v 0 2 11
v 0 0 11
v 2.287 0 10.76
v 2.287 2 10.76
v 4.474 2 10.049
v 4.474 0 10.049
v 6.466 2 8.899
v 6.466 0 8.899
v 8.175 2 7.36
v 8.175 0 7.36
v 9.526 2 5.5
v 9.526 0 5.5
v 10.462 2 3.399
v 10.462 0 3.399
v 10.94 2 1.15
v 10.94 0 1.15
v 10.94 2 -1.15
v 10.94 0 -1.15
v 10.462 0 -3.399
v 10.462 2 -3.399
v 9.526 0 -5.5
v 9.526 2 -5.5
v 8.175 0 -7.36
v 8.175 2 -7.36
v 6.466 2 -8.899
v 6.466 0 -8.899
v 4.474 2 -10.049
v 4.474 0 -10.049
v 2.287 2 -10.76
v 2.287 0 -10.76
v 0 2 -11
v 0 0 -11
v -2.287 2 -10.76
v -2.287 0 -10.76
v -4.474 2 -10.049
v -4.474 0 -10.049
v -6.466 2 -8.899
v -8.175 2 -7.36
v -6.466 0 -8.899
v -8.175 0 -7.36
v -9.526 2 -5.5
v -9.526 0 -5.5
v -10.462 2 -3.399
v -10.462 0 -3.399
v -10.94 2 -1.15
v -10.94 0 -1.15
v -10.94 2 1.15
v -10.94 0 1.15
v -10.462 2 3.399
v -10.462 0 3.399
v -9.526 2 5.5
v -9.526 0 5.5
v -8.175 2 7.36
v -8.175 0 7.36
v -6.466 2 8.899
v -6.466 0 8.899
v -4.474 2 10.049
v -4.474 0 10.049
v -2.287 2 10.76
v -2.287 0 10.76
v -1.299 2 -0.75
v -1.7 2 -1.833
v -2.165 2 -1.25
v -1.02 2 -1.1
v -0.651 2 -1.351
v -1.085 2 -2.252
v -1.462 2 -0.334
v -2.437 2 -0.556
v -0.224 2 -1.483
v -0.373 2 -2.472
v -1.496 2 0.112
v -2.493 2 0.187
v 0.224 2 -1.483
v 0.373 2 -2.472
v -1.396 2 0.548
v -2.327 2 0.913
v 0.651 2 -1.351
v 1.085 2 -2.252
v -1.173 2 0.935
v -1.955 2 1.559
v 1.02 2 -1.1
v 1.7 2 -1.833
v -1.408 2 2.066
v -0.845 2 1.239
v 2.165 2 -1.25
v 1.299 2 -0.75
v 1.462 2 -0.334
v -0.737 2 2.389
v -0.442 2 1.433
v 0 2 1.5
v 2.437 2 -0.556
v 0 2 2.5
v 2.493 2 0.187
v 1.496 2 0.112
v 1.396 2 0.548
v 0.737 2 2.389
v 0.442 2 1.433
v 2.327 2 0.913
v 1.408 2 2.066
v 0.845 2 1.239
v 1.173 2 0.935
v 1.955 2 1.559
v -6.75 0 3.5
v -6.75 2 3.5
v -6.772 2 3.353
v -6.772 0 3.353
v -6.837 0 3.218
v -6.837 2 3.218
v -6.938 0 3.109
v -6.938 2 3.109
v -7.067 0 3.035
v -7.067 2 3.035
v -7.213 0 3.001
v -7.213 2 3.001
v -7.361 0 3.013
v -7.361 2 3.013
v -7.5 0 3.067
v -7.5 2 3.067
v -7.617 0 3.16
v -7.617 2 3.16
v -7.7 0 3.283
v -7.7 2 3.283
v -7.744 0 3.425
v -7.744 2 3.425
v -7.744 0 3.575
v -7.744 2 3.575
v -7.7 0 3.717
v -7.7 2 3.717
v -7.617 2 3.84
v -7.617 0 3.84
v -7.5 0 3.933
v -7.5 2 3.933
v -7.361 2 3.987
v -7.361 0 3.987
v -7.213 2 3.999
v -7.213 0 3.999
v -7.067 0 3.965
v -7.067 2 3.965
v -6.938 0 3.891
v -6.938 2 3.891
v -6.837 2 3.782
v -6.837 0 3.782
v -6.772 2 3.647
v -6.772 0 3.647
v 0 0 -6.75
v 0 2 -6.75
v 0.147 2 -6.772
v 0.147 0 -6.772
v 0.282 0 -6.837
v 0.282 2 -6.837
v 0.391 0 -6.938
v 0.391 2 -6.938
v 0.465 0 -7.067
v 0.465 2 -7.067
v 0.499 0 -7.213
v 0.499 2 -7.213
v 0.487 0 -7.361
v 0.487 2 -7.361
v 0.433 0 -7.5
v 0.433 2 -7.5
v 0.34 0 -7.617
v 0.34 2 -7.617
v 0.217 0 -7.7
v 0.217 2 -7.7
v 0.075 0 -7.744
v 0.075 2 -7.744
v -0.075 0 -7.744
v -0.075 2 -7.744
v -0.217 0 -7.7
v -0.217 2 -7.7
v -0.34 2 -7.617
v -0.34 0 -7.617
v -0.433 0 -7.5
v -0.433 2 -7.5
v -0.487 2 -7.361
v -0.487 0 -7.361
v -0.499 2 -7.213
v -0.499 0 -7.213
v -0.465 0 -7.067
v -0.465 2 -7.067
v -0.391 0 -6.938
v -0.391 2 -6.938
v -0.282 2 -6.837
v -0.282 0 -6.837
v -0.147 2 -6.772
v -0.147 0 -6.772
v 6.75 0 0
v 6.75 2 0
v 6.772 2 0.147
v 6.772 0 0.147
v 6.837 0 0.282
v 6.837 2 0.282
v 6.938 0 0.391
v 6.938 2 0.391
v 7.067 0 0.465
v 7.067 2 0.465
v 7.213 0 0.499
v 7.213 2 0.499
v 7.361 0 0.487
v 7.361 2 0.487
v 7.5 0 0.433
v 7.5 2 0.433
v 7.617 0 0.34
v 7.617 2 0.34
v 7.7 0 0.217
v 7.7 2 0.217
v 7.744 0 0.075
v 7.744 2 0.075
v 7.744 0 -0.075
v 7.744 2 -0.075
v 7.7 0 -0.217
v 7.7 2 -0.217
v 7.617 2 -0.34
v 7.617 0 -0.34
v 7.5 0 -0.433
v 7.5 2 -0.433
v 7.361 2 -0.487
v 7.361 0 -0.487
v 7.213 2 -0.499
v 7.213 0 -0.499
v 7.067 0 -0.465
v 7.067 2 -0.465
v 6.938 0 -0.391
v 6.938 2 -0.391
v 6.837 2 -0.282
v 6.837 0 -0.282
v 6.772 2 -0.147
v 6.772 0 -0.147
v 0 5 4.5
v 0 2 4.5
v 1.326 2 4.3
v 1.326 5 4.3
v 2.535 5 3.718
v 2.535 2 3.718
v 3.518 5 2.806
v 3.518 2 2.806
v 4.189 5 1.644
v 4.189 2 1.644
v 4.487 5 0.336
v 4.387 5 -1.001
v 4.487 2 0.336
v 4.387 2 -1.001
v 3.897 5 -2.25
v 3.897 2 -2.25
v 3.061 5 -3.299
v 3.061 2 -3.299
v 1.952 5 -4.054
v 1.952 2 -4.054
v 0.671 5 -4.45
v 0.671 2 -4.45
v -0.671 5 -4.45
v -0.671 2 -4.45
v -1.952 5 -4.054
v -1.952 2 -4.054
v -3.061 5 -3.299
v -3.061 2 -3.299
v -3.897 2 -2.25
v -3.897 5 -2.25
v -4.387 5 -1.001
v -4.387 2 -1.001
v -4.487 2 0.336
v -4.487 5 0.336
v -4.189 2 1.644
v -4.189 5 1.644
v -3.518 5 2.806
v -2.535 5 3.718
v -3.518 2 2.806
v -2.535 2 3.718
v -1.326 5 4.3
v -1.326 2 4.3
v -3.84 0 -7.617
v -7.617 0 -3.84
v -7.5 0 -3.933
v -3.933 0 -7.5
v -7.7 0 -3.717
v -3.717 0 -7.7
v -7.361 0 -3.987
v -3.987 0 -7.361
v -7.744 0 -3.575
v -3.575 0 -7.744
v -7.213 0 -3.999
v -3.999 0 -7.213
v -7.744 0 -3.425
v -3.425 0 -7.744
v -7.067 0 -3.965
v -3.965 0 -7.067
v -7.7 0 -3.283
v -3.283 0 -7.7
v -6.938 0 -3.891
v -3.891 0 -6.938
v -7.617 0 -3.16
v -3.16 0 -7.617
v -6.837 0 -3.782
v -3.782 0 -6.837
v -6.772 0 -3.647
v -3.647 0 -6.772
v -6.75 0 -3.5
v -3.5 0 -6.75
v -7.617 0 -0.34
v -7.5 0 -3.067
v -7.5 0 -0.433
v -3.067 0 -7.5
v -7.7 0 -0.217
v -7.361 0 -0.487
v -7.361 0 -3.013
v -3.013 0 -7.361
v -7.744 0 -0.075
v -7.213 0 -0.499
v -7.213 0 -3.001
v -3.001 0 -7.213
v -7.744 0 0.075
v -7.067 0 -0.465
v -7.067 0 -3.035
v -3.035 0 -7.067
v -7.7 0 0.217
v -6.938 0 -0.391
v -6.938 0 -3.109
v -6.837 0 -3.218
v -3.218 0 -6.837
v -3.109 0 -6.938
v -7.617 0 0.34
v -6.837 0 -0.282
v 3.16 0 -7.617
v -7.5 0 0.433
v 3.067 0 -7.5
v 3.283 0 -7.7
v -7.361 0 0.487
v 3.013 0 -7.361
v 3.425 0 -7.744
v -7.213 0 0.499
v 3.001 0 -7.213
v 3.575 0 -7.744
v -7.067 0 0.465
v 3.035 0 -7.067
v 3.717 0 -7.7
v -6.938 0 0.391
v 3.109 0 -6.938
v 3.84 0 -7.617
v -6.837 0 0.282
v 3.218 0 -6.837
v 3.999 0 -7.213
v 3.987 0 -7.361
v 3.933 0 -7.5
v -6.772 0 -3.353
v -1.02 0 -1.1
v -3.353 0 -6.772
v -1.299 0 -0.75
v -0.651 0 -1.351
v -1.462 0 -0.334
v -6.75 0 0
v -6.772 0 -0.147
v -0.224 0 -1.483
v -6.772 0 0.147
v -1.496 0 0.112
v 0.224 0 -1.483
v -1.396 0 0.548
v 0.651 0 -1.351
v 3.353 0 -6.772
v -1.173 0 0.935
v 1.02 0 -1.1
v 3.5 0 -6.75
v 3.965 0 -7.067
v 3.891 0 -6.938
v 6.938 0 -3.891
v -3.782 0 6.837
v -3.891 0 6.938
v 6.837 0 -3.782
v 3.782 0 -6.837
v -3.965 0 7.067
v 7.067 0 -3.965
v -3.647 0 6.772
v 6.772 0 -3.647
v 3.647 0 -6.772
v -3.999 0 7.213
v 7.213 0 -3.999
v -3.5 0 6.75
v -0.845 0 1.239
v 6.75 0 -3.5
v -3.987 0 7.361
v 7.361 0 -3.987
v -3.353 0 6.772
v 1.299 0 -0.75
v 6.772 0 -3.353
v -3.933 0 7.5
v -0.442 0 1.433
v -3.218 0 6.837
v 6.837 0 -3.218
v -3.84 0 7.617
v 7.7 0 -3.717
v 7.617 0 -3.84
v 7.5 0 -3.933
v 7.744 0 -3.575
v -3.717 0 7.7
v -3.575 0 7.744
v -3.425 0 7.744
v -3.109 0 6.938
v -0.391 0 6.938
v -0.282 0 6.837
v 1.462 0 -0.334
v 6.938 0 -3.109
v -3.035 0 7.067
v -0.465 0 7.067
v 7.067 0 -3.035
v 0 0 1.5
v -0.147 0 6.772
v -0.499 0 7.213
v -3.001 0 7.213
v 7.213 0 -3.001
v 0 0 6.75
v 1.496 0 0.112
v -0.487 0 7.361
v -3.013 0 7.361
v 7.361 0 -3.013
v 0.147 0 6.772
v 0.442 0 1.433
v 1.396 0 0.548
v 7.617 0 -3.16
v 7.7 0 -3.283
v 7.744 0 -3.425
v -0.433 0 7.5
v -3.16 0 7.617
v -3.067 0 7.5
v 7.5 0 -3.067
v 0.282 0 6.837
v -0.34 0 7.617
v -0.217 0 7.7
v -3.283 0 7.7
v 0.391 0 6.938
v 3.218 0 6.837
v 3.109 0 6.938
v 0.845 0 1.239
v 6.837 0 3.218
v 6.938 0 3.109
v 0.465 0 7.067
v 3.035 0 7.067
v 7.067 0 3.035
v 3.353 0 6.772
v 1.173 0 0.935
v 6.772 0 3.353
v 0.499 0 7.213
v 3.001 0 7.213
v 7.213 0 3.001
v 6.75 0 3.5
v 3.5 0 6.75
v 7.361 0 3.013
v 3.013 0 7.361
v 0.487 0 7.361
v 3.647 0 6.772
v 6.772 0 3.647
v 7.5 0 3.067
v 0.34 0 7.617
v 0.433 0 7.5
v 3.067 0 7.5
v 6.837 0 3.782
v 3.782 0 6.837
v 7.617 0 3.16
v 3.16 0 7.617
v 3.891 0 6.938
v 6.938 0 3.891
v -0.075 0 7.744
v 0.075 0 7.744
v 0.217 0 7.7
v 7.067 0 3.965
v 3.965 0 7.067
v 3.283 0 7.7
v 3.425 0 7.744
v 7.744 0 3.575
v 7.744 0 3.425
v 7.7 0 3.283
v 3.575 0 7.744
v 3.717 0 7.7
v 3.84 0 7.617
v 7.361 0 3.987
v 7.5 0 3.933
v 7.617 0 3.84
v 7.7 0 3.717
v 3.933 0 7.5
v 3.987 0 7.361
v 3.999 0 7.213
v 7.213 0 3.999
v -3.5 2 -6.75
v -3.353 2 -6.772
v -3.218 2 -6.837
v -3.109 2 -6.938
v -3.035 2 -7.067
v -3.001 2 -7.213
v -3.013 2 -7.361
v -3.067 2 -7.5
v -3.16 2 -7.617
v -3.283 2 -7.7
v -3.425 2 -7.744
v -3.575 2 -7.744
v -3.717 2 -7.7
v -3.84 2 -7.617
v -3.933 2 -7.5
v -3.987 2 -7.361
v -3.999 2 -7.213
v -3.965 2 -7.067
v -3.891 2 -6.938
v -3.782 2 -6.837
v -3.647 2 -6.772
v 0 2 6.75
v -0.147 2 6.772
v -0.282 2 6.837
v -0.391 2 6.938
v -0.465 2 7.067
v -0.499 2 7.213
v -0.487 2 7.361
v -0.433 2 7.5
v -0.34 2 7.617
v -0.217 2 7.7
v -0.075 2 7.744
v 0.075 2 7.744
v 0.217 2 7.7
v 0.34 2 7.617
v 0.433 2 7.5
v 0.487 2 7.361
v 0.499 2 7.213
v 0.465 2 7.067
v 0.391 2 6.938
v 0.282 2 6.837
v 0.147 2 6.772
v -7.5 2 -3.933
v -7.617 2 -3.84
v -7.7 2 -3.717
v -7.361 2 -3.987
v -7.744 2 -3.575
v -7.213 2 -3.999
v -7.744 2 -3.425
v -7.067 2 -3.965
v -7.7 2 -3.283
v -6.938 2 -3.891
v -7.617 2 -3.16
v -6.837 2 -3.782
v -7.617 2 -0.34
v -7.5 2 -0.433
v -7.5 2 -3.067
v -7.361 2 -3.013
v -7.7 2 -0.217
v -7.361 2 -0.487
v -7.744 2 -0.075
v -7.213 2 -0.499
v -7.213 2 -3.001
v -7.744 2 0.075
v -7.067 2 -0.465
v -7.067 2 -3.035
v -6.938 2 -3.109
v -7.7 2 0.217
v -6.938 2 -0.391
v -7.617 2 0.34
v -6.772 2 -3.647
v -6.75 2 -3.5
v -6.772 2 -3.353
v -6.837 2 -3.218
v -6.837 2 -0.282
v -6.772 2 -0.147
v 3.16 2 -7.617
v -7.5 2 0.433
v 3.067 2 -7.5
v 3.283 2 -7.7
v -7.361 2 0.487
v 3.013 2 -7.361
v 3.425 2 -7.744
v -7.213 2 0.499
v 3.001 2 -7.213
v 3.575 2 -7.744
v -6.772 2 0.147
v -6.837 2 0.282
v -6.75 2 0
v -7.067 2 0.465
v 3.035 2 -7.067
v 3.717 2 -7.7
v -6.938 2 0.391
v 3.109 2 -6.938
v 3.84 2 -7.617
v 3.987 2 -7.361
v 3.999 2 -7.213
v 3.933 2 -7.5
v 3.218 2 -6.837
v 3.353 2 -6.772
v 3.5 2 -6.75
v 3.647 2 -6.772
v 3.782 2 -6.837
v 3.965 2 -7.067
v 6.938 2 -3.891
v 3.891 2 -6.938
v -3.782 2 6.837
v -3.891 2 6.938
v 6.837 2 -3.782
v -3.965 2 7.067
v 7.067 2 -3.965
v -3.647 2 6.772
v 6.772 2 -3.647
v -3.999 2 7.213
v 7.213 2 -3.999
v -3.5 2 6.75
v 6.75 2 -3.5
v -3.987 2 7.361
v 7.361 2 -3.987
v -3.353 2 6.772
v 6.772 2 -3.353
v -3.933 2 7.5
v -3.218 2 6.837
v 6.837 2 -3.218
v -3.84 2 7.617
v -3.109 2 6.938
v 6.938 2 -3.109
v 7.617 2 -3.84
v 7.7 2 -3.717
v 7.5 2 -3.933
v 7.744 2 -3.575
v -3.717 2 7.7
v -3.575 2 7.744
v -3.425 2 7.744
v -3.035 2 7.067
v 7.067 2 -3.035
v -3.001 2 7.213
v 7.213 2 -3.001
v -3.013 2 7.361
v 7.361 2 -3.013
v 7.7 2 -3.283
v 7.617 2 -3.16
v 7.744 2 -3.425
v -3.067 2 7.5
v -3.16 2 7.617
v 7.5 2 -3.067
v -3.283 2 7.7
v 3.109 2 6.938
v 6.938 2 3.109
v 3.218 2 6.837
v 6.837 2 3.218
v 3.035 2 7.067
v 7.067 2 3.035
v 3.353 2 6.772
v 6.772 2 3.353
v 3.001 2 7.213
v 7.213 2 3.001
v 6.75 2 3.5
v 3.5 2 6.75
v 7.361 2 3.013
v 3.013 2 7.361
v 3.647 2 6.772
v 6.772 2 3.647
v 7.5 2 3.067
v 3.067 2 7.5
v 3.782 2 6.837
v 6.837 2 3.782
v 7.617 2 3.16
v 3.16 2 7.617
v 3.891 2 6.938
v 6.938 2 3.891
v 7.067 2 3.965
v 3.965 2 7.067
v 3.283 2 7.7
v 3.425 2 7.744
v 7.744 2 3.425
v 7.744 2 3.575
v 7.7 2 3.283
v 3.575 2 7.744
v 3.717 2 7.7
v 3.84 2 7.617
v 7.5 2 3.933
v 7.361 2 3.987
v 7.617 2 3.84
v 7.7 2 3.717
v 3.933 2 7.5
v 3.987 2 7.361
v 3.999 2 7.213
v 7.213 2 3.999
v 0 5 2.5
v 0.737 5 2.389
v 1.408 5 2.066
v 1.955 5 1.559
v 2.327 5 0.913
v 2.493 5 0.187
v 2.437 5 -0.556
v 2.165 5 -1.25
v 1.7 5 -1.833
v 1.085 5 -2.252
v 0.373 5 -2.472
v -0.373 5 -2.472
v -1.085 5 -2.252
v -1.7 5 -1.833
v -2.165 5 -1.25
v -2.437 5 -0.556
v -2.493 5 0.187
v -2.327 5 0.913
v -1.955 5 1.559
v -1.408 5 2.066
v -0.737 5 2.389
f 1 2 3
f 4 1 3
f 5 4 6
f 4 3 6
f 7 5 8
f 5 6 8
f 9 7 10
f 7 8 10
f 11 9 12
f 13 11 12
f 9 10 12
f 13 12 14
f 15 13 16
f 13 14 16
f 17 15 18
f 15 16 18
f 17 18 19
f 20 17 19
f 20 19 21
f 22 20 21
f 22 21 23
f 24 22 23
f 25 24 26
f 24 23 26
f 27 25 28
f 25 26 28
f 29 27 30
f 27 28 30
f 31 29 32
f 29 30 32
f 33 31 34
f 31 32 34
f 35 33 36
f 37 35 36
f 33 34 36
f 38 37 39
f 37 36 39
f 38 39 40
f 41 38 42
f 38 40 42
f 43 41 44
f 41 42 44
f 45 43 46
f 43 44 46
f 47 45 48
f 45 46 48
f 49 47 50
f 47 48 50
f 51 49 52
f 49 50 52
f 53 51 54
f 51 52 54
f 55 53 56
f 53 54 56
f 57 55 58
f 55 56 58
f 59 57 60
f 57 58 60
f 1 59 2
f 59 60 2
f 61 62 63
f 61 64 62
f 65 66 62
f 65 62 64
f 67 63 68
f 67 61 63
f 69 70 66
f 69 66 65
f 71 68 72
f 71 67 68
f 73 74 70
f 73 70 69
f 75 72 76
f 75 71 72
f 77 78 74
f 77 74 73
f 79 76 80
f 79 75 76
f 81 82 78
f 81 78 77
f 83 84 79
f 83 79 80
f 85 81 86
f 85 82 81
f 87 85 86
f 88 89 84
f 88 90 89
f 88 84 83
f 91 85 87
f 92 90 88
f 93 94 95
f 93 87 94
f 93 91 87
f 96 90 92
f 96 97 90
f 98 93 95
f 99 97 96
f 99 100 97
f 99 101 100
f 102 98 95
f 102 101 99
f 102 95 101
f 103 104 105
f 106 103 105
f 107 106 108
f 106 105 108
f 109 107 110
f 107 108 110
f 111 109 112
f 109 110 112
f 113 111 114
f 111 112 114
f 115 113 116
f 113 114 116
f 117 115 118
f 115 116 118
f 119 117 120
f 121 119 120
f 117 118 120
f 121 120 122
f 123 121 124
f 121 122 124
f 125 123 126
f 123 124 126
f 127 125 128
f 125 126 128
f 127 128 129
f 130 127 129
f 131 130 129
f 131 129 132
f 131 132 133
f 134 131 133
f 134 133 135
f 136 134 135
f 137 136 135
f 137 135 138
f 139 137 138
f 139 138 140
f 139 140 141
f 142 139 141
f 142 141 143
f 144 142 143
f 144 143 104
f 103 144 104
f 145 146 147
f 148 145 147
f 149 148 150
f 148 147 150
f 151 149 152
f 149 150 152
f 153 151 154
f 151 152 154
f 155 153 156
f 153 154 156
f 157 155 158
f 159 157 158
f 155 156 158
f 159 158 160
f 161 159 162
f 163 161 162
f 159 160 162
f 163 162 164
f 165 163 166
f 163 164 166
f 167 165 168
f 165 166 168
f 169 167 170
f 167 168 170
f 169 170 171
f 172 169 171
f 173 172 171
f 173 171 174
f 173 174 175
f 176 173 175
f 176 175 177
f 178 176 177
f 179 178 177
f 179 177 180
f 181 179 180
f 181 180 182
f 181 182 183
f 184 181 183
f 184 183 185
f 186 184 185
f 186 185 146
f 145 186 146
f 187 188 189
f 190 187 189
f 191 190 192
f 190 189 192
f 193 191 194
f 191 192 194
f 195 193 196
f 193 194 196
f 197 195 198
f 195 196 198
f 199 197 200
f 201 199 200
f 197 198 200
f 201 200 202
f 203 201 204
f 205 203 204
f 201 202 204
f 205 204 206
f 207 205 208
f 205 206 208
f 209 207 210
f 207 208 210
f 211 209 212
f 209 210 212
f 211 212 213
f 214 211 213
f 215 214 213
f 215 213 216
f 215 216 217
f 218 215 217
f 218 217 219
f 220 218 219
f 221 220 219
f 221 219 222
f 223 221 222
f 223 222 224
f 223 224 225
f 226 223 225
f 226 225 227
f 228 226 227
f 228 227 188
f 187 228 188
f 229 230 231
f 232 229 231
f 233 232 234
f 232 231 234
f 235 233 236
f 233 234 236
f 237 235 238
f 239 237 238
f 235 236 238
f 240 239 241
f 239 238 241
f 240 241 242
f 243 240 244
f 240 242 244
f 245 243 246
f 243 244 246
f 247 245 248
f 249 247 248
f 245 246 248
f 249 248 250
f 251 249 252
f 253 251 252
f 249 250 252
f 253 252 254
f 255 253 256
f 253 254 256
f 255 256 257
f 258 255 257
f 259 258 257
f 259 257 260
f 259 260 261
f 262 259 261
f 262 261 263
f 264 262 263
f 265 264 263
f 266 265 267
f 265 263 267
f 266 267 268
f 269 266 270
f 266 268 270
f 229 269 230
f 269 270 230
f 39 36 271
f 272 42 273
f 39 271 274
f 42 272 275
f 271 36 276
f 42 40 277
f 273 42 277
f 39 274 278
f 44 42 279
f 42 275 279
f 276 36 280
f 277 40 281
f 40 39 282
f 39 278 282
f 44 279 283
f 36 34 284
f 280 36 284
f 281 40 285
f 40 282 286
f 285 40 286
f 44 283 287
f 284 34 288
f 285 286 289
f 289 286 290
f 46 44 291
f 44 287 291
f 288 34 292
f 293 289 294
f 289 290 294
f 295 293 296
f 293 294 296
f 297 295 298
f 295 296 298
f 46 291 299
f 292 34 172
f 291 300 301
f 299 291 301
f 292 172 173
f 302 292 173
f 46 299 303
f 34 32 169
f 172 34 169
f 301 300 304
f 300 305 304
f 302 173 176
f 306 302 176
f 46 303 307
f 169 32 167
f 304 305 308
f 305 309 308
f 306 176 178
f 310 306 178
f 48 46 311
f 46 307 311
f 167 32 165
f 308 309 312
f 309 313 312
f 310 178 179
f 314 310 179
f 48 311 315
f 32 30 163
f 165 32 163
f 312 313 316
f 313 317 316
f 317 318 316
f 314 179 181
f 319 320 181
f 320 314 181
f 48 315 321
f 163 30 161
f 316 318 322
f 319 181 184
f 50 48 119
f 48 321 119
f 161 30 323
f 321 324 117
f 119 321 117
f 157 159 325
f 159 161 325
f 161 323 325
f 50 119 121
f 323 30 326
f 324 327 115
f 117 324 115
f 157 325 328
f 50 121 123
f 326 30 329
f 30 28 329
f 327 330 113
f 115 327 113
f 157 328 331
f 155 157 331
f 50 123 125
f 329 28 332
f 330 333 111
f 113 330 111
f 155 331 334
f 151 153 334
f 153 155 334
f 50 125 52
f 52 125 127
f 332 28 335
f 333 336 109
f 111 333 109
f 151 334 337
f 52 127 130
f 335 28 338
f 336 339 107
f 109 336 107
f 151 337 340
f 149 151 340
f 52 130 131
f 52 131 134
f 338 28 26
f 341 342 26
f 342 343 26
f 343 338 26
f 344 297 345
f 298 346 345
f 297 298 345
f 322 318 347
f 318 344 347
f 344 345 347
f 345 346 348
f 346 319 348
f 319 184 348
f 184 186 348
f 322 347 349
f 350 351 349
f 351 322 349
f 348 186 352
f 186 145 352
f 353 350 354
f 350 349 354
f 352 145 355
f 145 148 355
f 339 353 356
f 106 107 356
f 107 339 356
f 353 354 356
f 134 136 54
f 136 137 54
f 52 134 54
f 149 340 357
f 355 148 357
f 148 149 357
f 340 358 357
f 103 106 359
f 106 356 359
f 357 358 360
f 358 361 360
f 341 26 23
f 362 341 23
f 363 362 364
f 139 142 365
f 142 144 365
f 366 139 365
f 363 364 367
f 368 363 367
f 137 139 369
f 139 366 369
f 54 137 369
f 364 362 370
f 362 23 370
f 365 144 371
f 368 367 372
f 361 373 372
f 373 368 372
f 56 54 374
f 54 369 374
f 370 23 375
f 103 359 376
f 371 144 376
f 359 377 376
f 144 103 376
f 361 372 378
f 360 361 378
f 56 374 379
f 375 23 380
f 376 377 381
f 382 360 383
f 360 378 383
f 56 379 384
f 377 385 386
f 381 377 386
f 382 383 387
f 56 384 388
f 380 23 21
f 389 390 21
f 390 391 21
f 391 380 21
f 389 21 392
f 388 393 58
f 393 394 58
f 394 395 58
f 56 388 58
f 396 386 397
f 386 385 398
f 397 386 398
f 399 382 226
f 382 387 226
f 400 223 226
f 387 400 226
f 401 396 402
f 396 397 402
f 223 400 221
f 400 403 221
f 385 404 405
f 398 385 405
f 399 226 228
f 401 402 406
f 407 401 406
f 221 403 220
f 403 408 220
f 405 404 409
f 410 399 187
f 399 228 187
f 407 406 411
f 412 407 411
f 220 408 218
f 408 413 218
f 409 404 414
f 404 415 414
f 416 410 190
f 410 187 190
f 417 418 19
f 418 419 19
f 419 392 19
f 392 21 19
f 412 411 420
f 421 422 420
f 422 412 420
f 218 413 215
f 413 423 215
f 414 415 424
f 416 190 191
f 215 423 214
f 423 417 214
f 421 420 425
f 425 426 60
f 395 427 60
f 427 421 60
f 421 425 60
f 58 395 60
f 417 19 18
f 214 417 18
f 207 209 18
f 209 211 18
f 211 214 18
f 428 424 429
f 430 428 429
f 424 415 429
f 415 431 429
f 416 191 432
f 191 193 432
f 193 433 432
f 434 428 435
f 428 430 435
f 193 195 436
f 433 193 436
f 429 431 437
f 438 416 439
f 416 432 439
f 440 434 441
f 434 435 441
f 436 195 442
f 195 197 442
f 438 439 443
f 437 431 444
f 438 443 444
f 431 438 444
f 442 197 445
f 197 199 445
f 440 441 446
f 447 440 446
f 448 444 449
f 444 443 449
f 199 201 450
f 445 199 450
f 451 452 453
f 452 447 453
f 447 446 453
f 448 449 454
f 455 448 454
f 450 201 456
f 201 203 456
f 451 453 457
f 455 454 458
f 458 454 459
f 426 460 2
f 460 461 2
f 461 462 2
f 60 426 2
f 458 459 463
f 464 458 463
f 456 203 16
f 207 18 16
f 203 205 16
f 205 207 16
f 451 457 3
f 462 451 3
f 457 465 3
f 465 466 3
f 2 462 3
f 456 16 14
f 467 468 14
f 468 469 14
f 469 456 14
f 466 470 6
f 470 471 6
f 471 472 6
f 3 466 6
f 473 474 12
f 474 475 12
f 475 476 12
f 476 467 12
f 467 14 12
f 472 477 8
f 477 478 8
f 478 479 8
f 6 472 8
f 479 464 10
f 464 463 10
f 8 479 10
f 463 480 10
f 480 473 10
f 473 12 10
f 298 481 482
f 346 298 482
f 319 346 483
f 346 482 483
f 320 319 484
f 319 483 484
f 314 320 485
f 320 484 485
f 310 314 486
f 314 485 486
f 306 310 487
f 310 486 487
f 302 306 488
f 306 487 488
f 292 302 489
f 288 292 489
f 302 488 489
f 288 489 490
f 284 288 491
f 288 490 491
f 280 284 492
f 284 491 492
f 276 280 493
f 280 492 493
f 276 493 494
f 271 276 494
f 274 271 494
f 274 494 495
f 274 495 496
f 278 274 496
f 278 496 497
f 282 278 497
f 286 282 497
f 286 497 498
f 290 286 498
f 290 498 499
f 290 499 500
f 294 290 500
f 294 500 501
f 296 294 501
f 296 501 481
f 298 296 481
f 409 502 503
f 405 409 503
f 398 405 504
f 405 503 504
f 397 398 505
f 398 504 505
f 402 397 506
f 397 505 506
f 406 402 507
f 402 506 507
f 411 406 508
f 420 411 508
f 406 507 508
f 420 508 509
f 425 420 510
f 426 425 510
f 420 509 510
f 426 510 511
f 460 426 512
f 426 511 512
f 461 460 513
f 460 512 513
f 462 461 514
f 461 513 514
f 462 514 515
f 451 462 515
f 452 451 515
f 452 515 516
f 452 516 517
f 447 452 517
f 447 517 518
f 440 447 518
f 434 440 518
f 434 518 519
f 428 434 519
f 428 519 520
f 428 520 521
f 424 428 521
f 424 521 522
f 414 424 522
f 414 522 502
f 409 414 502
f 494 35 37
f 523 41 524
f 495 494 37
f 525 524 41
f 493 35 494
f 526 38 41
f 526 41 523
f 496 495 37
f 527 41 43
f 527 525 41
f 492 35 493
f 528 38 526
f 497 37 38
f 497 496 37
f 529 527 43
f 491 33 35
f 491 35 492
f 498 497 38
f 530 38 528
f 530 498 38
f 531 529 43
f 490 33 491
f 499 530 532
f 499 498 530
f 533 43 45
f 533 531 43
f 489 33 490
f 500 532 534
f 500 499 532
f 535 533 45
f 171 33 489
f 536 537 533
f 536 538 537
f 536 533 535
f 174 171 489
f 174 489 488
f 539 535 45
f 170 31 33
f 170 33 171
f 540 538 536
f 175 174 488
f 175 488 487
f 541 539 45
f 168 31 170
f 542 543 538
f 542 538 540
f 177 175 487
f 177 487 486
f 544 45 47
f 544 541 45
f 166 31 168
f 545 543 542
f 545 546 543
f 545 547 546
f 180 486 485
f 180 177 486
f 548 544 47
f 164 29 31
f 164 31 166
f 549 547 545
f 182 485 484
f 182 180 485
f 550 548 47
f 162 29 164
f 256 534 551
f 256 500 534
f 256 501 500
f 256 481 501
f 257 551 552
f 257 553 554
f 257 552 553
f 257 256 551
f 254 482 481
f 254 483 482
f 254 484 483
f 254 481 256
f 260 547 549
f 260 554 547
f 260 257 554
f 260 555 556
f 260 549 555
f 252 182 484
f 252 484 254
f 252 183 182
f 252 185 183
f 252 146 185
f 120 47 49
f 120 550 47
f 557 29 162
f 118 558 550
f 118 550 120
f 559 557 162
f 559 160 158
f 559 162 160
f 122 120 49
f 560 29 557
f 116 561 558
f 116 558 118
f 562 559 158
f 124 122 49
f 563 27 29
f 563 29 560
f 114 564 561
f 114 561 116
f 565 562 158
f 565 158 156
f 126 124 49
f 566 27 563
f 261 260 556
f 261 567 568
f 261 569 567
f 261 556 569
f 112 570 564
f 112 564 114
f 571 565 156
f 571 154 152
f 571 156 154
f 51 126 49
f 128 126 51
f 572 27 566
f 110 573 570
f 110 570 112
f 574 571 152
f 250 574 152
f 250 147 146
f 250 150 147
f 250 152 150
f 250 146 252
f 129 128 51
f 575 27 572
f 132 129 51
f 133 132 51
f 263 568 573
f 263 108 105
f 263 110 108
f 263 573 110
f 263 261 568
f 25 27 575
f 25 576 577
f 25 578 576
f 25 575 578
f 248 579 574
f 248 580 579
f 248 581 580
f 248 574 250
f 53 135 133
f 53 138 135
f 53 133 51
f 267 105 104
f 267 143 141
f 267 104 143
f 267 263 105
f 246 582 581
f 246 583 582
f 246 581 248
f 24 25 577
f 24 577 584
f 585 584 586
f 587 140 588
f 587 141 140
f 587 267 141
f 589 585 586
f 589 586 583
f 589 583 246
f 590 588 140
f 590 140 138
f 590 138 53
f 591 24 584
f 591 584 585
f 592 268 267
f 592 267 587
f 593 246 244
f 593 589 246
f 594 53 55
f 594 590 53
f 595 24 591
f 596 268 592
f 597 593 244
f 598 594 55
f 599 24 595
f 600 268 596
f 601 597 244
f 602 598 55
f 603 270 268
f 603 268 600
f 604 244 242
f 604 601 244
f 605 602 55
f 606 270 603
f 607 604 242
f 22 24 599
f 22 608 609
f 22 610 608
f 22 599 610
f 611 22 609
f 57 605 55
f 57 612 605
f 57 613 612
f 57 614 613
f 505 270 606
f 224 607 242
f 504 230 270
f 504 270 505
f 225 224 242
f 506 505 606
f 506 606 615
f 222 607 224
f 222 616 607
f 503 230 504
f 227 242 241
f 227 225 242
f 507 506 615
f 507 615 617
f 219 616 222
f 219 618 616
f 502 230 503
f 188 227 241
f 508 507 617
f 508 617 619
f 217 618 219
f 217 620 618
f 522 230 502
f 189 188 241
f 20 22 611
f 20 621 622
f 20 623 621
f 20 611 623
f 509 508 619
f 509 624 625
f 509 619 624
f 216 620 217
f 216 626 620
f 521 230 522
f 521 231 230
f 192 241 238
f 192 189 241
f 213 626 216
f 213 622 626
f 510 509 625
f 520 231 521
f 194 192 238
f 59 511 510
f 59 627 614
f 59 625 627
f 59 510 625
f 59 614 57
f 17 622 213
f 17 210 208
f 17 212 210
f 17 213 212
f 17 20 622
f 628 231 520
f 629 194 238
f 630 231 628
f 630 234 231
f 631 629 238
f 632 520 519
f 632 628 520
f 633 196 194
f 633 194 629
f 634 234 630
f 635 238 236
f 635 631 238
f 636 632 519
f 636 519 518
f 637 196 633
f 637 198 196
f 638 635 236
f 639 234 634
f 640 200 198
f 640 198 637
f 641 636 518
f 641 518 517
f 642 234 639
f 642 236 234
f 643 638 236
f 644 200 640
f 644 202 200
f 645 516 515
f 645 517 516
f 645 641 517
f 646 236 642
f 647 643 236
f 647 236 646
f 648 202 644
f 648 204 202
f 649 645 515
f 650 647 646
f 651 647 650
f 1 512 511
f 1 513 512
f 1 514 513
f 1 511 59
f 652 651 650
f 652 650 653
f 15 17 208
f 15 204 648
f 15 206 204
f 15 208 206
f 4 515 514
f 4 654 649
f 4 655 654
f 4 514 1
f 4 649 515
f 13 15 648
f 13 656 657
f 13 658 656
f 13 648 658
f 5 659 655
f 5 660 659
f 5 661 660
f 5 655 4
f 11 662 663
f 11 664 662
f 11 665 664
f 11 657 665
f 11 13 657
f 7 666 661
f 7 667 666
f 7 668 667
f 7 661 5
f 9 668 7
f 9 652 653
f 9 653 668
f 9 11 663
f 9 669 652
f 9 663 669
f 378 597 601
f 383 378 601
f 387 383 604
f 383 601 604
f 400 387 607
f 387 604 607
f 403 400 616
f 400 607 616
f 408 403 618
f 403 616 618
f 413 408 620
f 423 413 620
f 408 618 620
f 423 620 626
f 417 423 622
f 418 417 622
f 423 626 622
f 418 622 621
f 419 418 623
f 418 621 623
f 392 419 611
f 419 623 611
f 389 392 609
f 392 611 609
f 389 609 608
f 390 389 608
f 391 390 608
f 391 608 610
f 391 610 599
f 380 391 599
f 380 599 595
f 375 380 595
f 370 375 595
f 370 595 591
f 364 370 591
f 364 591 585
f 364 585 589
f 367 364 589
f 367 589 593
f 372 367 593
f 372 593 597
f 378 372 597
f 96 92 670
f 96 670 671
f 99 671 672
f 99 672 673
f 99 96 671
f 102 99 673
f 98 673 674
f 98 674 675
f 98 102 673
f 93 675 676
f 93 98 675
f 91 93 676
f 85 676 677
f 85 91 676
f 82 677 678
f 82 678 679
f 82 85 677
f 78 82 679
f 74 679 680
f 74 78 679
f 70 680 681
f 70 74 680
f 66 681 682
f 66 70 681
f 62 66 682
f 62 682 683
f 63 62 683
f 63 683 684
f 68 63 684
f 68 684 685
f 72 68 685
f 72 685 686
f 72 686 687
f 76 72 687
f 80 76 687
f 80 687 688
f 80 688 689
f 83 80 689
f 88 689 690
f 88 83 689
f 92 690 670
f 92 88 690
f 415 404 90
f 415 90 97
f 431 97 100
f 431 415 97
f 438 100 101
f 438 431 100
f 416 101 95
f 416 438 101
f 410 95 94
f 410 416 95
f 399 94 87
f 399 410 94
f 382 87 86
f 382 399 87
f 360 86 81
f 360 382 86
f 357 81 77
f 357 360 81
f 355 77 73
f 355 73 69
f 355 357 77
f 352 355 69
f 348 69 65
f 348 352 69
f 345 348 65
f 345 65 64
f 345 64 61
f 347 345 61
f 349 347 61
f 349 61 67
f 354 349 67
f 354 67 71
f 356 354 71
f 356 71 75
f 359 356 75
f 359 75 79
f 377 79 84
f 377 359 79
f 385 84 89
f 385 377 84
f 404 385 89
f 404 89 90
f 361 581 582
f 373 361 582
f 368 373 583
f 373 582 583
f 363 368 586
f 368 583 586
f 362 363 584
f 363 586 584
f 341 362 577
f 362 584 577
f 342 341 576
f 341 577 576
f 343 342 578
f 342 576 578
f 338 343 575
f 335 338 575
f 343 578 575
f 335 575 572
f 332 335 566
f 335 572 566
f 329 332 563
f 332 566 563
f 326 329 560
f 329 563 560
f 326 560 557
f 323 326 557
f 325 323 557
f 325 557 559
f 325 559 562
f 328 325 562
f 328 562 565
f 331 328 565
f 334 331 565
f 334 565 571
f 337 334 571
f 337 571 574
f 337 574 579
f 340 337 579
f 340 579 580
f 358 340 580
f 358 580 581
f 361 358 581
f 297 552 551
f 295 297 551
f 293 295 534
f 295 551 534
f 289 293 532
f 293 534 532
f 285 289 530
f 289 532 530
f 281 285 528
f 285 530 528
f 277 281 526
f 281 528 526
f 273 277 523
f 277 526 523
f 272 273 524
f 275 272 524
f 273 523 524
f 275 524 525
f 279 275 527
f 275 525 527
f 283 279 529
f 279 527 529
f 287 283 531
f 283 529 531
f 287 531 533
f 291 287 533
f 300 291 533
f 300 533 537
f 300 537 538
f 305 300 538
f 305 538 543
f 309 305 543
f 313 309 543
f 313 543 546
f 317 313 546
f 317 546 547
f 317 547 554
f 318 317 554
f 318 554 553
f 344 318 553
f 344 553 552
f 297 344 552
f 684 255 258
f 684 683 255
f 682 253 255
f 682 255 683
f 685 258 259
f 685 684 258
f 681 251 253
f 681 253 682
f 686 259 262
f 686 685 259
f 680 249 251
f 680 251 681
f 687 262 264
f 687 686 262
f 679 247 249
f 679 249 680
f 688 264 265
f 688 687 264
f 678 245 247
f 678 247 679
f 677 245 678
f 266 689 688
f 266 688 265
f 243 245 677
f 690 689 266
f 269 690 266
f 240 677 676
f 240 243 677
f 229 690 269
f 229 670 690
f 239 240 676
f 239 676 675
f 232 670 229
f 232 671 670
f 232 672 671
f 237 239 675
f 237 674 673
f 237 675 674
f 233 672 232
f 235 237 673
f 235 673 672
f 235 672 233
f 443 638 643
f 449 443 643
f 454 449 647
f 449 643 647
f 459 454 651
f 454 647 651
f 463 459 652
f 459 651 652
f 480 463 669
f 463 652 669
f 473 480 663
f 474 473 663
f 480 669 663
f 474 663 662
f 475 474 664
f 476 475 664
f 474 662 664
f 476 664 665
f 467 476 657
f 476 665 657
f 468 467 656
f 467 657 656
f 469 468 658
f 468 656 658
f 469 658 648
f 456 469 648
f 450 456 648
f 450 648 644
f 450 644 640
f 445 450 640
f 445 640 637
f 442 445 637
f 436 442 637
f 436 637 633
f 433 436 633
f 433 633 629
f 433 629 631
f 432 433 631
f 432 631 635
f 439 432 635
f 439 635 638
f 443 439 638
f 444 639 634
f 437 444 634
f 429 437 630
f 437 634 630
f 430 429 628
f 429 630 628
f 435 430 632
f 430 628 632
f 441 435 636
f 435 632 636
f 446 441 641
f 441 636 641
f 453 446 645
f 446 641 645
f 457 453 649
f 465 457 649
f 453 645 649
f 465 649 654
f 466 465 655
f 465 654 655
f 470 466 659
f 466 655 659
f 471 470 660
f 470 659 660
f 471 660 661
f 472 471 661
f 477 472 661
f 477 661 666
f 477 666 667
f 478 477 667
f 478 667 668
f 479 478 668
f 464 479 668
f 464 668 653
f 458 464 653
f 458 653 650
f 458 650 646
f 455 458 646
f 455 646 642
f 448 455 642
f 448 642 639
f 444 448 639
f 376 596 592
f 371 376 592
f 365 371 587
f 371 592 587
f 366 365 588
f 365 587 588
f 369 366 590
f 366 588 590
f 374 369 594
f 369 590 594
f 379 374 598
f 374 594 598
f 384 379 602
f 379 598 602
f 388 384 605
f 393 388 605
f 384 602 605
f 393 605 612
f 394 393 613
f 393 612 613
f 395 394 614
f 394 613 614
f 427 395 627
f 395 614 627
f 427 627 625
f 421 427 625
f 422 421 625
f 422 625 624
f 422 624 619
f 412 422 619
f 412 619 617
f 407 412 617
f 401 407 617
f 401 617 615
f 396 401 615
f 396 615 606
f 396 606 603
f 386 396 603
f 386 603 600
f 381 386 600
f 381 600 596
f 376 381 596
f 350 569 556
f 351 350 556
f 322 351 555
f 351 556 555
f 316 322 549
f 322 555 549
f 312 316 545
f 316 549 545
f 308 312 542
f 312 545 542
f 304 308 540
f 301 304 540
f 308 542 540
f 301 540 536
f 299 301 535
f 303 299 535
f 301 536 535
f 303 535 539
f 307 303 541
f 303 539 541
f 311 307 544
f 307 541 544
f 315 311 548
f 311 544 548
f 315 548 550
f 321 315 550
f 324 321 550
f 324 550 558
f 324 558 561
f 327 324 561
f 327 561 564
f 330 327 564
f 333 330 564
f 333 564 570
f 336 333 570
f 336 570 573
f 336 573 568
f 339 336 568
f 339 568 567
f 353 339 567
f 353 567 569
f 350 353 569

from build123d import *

# Parameters (mm, degrees)
SKETCH1_R           = 11
SKETCH1_R_2         = 1.5
BOSS_EXTRUDE1_DEPTH = 2
SKETCH2_R           = 4.5
SKETCH2_R_2         = 2.5
BOSS_EXTRUDE2_DEPTH = 3
SKETCH3_R           = 0.5
CUT_EXTRUDE1_DEPTH  = 16.842979518
CIRPATTERN1_COUNT   = 4


with BuildPart() as part:
    # Sketch1 → Boss-Extrude1 (new body)
    with BuildSketch(Plane(origin=(0, 0, 0), x_dir=(1, 0, 0), z_dir=(0, 1, 0))):
        with Locations(Location((0, 0, 0), (0, 0, 270))):
            Circle(SKETCH1_R)
        with Locations(Location((0, 0, 0), (0, 0, 270))):
            Circle(SKETCH1_R_2, mode=Mode.SUBTRACT)
    extrude(amount=BOSS_EXTRUDE1_DEPTH)

    # Sketch2 → Boss-Extrude2 (add)
    with BuildSketch(Plane(origin=(0, 2, 0), x_dir=(1, 0, 0), z_dir=(0, 1, 0))):
        with Locations(Location((0, 0, 0), (0, 0, 270))):
            Circle(SKETCH2_R)
        with Locations(Location((0, 0, 0), (0, 0, 270))):
            Circle(SKETCH2_R_2, mode=Mode.SUBTRACT)
    extrude(amount=BOSS_EXTRUDE2_DEPTH)

    # Sketch3 → Cut-Extrude1 (cut, through all)
    with BuildSketch(Plane(origin=(0, 2, 0), x_dir=(1, 0, 0), z_dir=(0, 1, 0))):
        with Locations(Location((-3.5, 7.25, 0), (0, 0, 270))):
            Circle(SKETCH3_R)
        with Locations(Location((0, 7.25, 0), (0, 0, 270))):
            Circle(SKETCH3_R)
        with Locations(Location((3.5, 7.25, 0), (0, 0, 270))):
            Circle(SKETCH3_R)
    cut_extrude1 = extrude(amount=-CUT_EXTRUDE1_DEPTH, mode=Mode.SUBTRACT)

    # CirPattern1: Cut-Extrude1 ×4 about axis
    cirpattern1_axis = Axis((0, 0, 0), (0, 1, 0))
    for i in range(1, CIRPATTERN1_COUNT):
        add(cut_extrude1.rotate(cirpattern1_axis, i * 360 / CIRPATTERN1_COUNT), mode=Mode.SUBTRACT)


solid = part.part
